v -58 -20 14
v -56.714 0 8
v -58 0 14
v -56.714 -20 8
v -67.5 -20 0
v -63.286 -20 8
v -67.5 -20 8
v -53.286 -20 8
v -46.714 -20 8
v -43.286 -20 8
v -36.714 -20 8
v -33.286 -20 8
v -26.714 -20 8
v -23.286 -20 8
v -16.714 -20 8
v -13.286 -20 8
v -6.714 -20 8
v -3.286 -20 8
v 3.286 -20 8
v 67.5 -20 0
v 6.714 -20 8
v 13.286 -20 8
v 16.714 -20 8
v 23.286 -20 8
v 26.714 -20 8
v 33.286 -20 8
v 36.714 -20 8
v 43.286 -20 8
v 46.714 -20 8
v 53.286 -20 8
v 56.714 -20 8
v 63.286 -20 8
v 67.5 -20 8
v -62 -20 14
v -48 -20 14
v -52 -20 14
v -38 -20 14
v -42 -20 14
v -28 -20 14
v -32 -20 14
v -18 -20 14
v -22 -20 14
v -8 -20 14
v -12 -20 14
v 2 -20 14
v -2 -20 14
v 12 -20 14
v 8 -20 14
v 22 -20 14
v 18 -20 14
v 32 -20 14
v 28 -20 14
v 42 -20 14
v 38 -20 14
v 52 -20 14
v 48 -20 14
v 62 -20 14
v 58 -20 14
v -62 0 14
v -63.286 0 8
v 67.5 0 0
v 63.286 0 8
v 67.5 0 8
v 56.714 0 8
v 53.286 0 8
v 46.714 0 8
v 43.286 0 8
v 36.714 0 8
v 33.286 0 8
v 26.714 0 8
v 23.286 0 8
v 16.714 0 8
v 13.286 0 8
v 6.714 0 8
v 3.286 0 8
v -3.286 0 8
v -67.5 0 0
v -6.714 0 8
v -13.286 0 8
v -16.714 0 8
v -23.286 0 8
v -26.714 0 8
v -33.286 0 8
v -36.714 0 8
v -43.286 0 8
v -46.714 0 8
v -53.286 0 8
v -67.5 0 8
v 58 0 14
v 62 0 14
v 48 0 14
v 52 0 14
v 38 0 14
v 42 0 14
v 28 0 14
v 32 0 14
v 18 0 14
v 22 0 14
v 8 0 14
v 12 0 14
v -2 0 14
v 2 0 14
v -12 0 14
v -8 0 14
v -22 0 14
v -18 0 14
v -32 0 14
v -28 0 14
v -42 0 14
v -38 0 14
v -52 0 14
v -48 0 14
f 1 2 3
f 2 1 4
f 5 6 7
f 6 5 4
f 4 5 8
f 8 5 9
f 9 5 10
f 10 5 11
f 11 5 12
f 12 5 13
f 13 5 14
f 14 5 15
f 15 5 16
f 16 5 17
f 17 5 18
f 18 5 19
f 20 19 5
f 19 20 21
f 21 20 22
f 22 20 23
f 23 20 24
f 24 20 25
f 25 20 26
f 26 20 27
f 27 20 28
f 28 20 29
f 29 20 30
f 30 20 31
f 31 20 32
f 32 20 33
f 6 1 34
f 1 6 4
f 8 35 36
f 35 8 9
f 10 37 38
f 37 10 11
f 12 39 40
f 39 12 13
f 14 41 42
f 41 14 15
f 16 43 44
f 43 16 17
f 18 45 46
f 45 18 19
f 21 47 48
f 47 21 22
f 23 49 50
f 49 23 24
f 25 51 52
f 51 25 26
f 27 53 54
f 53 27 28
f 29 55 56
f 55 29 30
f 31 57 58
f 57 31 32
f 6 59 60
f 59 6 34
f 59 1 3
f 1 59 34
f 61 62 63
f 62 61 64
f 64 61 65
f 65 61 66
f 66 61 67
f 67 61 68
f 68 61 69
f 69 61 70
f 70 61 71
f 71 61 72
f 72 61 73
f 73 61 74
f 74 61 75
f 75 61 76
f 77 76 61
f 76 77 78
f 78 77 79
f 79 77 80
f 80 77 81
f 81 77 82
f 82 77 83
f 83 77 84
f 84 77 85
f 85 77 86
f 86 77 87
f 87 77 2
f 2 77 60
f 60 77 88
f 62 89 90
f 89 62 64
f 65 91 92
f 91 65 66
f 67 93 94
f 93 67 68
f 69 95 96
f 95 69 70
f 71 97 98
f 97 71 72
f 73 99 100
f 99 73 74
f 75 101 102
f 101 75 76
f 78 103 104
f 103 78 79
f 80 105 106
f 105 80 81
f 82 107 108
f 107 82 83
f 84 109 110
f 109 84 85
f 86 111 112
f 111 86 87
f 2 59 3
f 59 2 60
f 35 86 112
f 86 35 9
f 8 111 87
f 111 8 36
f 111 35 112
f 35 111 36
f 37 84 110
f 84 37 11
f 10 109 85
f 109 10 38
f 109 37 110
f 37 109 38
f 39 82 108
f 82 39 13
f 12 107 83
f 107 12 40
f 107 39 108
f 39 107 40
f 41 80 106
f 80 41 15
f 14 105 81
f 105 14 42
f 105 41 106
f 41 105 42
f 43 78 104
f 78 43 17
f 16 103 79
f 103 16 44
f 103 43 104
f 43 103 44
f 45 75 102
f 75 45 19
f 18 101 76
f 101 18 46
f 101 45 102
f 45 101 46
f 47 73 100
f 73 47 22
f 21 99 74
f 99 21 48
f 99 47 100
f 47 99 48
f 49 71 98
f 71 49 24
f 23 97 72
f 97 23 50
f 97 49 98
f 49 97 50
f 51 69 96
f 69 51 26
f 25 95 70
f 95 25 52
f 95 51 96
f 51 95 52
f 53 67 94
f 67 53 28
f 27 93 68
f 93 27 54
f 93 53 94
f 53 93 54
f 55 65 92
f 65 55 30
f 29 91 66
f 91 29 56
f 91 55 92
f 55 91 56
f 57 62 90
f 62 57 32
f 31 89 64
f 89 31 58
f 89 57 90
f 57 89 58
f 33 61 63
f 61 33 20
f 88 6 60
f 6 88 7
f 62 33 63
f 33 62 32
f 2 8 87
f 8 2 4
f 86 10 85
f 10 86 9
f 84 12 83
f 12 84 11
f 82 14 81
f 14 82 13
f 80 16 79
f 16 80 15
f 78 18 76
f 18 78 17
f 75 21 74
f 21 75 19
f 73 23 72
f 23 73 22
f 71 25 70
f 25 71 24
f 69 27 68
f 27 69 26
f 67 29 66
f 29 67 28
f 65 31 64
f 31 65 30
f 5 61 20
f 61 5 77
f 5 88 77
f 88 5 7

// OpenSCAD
$fn = 32;

// ----------------------------------------------------------------------
// Toothed rack, 13 teeth
// 10 mm pitch, 6 mm teeth
// ----------------------------------------------------------------------

// --- parameters (mm) ---
bar_w = 20;   // bar width (Y)
bar_h = 8;    // bar height (Z)
teeth = 13;   // number of teeth
pitch = 10;   // tooth pitch
tooth_h = 6;  // tooth height above the bar
root_w = 7;   // tooth width at the root
crest_w = 4;  // tooth width at the crest

// --- derived feature positions (mm) ---
span = (teeth - 1) * pitch;  // = 120   distance between the outer teeth
bar_l = span + root_w + 8;   // = 135   bar length: teeth plus 4 mm at each end
tooth_x = -span / 2;         // = -60   X of the first tooth
height = bar_h + tooth_h;    // = 14   overall height
feature_centers = [
  [tooth_x + 0 * pitch, -bar_w / 2],
  [tooth_x + 1 * pitch, -bar_w / 2],
  [tooth_x + 2 * pitch, -bar_w / 2],
  [tooth_x + 3 * pitch, -bar_w / 2],
  [tooth_x + 4 * pitch, -bar_w / 2],
  [tooth_x + 5 * pitch, -bar_w / 2],
  [tooth_x + 6 * pitch, -bar_w / 2],
  [tooth_x + 7 * pitch, -bar_w / 2],
  [tooth_x + 8 * pitch, -bar_w / 2],
  [tooth_x + 9 * pitch, -bar_w / 2],
  [tooth_x + 10 * pitch, -bar_w / 2],
  [tooth_x + 11 * pitch, -bar_w / 2],
  [tooth_x + 12 * pitch, -bar_w / 2]
];   // tooth centre line, drives the tooth loop

// bar with a rack of teeth, one extruded trapezoium per centre
module rack_tooth() {
  linear_extrude(height = bar_w)
    polygon(points = [
      [0, 0],
      [root_w, 0],
      [root_w / 2 + crest_w / 2, tooth_h + 1],
      [root_w / 2 - crest_w / 2, tooth_h + 1]
    ]);
}

union() {
  translate([-bar_l / 2, -bar_w, 0]) cube([bar_l, bar_w, bar_h]);
  for (centre = feature_centers)
    translate([centre[0] - root_w / 2, 0, bar_h - 1]) rotate([90, 0, 0]) rack_tooth();
}
